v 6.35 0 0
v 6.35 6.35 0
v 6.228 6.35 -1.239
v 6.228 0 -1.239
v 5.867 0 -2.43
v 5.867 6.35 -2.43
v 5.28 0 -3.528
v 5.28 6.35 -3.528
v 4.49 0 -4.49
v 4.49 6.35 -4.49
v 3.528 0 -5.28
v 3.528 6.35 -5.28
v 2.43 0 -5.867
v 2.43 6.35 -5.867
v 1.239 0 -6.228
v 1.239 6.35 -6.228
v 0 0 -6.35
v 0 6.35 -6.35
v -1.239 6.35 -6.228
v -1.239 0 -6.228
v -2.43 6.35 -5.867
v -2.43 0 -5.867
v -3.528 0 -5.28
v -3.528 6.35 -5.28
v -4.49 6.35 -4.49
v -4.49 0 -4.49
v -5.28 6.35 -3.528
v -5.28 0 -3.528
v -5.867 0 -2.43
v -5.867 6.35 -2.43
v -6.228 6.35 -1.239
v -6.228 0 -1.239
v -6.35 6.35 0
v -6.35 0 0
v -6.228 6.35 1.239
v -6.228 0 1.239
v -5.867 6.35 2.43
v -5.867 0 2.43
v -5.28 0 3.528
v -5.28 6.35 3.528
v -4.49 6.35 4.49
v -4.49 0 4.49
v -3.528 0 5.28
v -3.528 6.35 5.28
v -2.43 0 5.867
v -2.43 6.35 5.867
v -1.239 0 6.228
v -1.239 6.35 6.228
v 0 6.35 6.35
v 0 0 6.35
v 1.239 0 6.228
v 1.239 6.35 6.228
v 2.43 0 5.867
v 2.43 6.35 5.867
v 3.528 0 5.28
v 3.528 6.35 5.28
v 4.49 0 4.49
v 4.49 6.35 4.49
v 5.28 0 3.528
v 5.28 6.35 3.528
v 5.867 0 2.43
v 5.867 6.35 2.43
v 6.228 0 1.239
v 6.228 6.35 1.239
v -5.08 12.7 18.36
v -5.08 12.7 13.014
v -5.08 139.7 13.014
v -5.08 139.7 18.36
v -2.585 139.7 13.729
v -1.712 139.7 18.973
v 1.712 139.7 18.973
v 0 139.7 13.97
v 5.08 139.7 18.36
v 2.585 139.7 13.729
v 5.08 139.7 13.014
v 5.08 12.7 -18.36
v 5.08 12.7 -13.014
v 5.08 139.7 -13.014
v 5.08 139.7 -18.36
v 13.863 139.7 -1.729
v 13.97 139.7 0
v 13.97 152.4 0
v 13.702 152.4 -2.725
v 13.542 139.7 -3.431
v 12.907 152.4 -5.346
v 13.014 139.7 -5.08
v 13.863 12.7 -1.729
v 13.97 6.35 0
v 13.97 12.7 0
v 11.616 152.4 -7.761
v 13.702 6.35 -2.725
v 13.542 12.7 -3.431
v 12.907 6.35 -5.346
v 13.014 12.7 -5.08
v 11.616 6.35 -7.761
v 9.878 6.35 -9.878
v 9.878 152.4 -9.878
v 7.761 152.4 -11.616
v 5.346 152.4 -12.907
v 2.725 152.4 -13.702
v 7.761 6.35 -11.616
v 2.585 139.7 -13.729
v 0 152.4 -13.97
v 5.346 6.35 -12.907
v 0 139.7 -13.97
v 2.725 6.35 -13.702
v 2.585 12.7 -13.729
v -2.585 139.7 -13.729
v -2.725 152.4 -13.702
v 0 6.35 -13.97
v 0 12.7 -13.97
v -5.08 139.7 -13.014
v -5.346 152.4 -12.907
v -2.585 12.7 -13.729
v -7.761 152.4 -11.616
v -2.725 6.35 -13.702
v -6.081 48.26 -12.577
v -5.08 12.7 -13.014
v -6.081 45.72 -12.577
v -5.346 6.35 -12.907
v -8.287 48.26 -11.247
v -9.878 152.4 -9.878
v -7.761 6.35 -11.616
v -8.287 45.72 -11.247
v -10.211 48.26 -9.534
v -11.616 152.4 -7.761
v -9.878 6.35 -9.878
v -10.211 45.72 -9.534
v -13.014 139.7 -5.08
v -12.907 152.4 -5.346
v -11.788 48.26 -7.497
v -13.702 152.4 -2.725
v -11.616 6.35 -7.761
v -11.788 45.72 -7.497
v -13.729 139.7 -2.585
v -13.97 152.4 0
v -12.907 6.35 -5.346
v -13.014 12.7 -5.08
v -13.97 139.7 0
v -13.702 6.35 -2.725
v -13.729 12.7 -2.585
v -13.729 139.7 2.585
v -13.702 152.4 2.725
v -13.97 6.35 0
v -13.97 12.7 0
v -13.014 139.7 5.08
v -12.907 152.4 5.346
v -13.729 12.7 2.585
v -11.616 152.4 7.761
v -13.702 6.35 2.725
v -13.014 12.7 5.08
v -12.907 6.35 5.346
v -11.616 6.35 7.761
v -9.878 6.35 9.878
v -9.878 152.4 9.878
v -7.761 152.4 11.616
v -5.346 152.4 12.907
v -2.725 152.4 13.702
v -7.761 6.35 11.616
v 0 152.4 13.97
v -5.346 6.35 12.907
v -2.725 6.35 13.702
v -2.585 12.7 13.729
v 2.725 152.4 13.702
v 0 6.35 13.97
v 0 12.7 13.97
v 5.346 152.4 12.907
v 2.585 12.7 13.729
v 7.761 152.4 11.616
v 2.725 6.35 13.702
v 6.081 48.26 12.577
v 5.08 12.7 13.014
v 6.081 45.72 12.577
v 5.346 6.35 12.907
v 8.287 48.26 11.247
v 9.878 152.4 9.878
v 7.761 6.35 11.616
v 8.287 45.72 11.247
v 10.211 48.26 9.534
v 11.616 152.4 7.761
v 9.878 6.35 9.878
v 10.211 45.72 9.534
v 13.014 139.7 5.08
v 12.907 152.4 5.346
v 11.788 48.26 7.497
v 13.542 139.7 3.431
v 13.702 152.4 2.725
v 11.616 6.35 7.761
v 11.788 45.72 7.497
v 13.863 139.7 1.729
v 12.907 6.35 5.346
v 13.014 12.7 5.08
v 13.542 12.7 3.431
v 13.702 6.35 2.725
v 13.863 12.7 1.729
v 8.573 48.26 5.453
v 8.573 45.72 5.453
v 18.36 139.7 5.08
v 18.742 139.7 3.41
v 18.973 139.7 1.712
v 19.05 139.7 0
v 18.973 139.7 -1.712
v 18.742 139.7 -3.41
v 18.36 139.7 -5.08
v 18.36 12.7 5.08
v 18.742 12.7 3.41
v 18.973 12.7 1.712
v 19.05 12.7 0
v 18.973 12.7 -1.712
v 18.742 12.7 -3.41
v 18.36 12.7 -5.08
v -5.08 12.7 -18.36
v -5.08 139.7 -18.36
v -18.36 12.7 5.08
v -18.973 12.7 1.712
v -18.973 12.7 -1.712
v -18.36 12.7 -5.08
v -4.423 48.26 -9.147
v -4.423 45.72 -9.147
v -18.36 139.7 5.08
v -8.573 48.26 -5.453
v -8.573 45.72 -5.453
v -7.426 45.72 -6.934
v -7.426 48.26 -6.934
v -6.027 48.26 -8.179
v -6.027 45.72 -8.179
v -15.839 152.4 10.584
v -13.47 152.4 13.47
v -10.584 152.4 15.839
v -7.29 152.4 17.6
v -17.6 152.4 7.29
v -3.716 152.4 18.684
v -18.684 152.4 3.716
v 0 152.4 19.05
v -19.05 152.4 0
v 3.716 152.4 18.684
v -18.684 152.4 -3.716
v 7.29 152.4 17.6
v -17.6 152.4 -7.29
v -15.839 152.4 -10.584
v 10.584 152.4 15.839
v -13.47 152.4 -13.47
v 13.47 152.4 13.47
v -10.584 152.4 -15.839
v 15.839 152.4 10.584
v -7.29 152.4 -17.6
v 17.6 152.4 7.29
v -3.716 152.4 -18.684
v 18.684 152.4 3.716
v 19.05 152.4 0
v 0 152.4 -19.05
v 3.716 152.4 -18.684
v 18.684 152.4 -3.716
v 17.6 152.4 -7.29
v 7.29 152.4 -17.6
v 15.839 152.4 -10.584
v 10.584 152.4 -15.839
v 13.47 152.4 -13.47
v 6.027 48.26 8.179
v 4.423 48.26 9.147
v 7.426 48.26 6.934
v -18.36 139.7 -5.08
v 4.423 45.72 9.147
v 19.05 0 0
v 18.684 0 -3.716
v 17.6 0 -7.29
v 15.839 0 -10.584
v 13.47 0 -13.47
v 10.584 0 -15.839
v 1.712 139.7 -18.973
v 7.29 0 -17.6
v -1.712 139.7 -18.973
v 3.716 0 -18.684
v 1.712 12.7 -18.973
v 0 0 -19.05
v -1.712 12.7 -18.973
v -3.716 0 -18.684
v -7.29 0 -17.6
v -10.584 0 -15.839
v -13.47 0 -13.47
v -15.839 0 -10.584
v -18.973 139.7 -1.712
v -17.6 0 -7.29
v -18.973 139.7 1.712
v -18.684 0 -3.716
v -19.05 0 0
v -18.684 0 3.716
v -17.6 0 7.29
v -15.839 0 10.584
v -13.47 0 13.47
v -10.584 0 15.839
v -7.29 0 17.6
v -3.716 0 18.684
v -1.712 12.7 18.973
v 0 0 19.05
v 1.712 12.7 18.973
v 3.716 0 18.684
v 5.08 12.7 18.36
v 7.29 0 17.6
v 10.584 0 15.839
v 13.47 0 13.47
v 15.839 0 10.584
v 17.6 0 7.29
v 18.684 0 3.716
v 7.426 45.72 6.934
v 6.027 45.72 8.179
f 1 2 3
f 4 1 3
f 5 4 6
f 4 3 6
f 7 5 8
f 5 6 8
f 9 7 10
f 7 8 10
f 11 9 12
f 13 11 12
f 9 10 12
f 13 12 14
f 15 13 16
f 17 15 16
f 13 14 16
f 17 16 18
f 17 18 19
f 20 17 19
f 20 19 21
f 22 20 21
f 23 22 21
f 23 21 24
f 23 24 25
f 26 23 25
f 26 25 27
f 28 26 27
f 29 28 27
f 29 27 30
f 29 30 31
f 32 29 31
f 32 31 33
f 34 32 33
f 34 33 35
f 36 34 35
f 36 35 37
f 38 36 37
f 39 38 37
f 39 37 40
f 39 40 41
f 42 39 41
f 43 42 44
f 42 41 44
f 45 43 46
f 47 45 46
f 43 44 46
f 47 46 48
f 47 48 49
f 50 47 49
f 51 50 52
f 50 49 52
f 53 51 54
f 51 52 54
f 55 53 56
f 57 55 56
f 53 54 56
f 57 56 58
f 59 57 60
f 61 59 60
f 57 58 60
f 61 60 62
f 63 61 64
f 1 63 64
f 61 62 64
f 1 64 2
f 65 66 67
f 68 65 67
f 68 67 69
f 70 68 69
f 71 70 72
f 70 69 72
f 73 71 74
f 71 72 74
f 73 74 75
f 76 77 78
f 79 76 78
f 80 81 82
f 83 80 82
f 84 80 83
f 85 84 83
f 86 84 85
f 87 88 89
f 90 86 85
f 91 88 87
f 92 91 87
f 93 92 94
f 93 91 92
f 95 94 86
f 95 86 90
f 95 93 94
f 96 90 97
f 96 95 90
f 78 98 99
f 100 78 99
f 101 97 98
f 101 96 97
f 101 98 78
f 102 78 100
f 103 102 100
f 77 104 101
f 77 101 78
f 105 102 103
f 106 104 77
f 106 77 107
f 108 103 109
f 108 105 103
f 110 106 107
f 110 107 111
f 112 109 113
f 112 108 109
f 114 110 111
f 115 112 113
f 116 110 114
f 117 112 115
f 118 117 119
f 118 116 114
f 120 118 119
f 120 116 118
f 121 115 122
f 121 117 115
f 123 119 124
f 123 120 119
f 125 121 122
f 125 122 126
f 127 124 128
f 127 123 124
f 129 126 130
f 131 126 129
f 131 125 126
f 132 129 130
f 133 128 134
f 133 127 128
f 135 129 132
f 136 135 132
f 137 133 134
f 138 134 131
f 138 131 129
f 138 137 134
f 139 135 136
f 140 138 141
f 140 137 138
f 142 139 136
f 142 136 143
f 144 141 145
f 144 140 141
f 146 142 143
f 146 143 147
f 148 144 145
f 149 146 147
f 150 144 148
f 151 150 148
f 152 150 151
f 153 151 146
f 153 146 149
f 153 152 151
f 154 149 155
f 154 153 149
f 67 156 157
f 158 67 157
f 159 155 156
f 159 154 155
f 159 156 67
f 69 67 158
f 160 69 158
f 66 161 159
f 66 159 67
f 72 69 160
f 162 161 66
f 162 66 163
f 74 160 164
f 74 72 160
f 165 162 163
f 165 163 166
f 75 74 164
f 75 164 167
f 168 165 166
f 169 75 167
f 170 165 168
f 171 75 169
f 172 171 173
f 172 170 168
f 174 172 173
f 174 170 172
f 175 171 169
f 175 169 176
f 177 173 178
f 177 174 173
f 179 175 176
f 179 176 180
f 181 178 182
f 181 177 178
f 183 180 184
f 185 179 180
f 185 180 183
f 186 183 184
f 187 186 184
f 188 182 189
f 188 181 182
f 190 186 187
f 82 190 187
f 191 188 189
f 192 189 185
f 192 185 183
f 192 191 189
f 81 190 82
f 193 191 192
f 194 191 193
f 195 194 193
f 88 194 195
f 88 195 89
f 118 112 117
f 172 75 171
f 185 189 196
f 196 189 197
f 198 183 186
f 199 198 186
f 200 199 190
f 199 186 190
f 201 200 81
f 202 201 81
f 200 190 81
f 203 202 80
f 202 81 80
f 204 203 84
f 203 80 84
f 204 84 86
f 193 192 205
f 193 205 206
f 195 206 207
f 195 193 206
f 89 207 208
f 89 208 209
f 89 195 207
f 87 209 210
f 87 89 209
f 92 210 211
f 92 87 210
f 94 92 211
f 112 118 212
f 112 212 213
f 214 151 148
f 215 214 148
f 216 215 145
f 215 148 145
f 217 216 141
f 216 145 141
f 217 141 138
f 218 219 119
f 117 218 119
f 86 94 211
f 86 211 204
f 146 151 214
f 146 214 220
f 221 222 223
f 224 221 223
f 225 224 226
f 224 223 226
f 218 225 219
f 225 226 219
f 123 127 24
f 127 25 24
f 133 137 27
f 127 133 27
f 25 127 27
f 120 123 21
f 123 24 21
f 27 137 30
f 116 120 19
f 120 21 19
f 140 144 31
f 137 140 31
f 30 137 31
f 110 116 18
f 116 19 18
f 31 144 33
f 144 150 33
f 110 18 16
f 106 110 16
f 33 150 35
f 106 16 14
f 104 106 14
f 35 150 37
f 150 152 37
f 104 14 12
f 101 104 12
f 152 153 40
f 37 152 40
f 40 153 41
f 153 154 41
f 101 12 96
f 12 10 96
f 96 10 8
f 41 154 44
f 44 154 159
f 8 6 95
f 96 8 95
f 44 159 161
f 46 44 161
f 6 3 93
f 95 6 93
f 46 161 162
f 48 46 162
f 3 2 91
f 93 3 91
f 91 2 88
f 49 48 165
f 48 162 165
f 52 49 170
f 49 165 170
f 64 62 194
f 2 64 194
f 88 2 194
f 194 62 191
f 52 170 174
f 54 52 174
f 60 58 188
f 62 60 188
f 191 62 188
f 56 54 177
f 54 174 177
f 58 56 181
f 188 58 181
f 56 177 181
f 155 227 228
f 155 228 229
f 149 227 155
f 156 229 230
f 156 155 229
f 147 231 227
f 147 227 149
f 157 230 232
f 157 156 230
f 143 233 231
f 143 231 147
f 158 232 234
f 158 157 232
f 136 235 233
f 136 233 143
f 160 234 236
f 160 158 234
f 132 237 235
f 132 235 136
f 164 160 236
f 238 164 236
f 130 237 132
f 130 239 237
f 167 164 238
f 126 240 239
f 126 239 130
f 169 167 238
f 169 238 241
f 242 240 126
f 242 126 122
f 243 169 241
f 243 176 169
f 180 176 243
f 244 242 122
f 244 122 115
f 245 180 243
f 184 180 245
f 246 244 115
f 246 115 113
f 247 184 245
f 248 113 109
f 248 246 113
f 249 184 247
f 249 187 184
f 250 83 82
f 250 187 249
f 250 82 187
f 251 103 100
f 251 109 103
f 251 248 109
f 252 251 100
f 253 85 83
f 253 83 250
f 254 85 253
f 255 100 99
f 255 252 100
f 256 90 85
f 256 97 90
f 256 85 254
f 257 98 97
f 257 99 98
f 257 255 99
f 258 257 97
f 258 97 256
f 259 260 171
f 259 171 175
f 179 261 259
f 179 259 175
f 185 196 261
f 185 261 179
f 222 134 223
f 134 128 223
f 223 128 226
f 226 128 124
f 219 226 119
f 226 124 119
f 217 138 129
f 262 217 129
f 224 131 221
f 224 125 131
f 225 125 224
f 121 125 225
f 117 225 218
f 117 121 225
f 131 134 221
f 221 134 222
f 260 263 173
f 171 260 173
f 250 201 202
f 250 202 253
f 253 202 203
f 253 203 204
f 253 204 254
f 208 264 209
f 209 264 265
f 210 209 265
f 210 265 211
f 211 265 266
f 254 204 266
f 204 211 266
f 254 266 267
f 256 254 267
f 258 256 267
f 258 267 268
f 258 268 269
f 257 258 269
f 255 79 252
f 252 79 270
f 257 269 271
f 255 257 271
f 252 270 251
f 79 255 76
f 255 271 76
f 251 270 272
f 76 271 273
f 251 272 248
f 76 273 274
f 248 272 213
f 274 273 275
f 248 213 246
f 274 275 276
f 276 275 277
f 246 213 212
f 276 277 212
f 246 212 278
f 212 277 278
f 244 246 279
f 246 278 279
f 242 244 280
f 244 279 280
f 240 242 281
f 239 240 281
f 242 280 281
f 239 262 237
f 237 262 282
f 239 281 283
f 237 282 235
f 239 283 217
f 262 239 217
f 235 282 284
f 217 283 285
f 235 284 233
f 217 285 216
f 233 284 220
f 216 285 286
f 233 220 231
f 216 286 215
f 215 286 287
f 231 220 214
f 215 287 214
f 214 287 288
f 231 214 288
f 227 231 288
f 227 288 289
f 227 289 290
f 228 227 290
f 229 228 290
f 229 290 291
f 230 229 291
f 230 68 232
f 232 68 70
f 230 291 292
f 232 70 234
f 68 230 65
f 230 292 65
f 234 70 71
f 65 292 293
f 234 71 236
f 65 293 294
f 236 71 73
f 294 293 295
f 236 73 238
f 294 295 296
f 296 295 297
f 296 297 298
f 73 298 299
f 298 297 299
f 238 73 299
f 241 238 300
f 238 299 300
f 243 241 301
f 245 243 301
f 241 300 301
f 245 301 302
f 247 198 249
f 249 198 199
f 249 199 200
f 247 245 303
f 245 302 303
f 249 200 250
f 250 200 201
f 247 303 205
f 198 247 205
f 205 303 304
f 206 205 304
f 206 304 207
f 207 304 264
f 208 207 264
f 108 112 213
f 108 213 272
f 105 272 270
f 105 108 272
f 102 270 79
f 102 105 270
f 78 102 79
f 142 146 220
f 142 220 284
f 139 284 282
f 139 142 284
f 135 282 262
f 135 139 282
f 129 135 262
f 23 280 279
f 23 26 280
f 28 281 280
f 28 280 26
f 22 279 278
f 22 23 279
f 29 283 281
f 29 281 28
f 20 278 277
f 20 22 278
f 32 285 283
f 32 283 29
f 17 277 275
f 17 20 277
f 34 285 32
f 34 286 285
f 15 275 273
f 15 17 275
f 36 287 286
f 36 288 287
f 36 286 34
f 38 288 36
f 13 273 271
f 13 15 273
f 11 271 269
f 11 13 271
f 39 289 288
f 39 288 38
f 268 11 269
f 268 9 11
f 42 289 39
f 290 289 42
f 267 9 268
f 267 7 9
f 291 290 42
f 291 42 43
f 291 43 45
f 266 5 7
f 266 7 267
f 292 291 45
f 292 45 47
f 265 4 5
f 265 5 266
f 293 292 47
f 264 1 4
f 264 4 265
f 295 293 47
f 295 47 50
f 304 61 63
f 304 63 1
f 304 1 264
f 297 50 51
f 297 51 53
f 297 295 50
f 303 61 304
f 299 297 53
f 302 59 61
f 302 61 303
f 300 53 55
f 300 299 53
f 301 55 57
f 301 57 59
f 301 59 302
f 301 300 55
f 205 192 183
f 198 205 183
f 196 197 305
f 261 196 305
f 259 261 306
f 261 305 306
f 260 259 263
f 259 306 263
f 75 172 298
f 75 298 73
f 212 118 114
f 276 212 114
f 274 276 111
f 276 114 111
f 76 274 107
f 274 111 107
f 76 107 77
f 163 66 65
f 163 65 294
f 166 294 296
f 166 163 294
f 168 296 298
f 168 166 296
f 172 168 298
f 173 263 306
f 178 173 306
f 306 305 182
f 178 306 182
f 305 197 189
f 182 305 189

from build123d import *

# Parameters (mm, degrees)
SKETCH1_R               = 19.05
SKETCH1_R_2             = 13.97
BOSS_EXTRUDE1_DEPTH     = 152.4
SKETCH2_R               = 13.97
BOSS_EXTRUDE2_DEPTH     = 6.35
SKETCH3_R               = 2.2479
CUT_EXTRUDE1_DEPTH      = 3.54
CUT_EXTRUDE1_DEPTH_BACK = 36.56
SKETCH5_W               = 10.16
SKETCH5_H               = 127
CUT_EXTRUDE5_DEPTH      = 20.0500001
CUT_EXTRUDE5_DEPTH_BACK = 20.0500001
SKETCH8_W               = 10.16
SKETCH8_H               = 127
CUT_EXTRUDE6_DEPTH      = 20.050000101
CUT_EXTRUDE6_DEPTH_BACK = 20.050000101
SKETCH7_R               = 6.35
CUT_EXTRUDE4_DEPTH      = 7.35
BOSS_EXTRUDE3_DEPTH     = 2.54


with BuildPart() as part:
    # Sketch1 → Boss-Extrude1 (new body)
    with BuildSketch(Plane(origin=(0, 0, 0), x_dir=(1, 0, 0), z_dir=(0, 1, 0))):
        Circle(SKETCH1_R)
        Circle(SKETCH1_R_2, mode=Mode.SUBTRACT)
    extrude(amount=BOSS_EXTRUDE1_DEPTH)

    # Sketch2 → Boss-Extrude2 (add)
    with BuildSketch(Plane.XZ):
        Circle(SKETCH2_R)
    extrude(amount=-BOSS_EXTRUDE2_DEPTH)

    # Sketch3 → Cut-Extrude1 (cut, two sides)
    with BuildSketch(Plane.XY.offset(16.51)) as cut_extrude1_sk:
        with Locations((0, 101.6)):
            Circle(SKETCH3_R)
    extrude(amount=CUT_EXTRUDE1_DEPTH, mode=Mode.SUBTRACT)
    extrude(cut_extrude1_sk.sketch, amount=-CUT_EXTRUDE1_DEPTH_BACK, mode=Mode.SUBTRACT)

    # Sketch5 → Cut-Extrude5 (cut, two sides)
    with BuildSketch(Plane(origin=(0, 0, 0), x_dir=(0, 0, -1), z_dir=(1, 0, 0))) as cut_extrude5_sk:
        with Locations((0, 76.2)):
            Rectangle(SKETCH5_W, SKETCH5_H)
    extrude(amount=CUT_EXTRUDE5_DEPTH, mode=Mode.SUBTRACT)
    extrude(cut_extrude5_sk.sketch, amount=-CUT_EXTRUDE5_DEPTH_BACK, mode=Mode.SUBTRACT)

    # Sketch8 → Cut-Extrude6 (cut, two sides)
    with BuildSketch(Plane.XY) as cut_extrude6_sk:
        with Locations((0, 76.2)):
            Rectangle(SKETCH8_W, SKETCH8_H)
    extrude(amount=CUT_EXTRUDE6_DEPTH, mode=Mode.SUBTRACT)
    extrude(cut_extrude6_sk.sketch, amount=-CUT_EXTRUDE6_DEPTH_BACK, mode=Mode.SUBTRACT)

    # Sketch7 → Cut-Extrude4 (cut, through all)
    with BuildSketch(Plane(origin=(0, 6.35, 0), x_dir=(1, 0, 0), z_dir=(0, 1, 0))):
        Circle(SKETCH7_R)
    extrude(amount=-CUT_EXTRUDE4_DEPTH, mode=Mode.SUBTRACT)

    # Sketch9 → Boss-Extrude3 (add)
    with BuildSketch(Plane(origin=(0, 45.72, 0), x_dir=(-1, 0, 0), z_dir=(0, -1, 0))):
        with BuildLine():
            Line((-11.787736325, -7.497344352), (-8.572899145, -5.452614074))
            ThreePointArc((-8.572899145, -5.452614074), (-6.7552586, -7.588944673), (-4.422740729, -9.14685544))
            Line((-4.422740729, -9.14685544), (-6.081268502, -12.57692623))
            ThreePointArc((-6.081268502, -12.57692623), (-9.288480575, -10.434798925), (-11.787736325, -7.497344352))
        make_face()
        with BuildLine():
            Line((11.787736325, 7.497344352), (8.572899145, 5.452614074))
            ThreePointArc((8.572899145, 5.452614074), (6.7552586, 7.588944673), (4.422740729, 9.14685544))
            Line((4.422740729, 9.14685544), (6.081268502, 12.57692623))
            ThreePointArc((6.081268502, 12.57692623), (9.288480575, 10.434798925), (11.787736325, 7.497344352))
        make_face()
    extrude(amount=-BOSS_EXTRUDE3_DEPTH)


solid = part.part
